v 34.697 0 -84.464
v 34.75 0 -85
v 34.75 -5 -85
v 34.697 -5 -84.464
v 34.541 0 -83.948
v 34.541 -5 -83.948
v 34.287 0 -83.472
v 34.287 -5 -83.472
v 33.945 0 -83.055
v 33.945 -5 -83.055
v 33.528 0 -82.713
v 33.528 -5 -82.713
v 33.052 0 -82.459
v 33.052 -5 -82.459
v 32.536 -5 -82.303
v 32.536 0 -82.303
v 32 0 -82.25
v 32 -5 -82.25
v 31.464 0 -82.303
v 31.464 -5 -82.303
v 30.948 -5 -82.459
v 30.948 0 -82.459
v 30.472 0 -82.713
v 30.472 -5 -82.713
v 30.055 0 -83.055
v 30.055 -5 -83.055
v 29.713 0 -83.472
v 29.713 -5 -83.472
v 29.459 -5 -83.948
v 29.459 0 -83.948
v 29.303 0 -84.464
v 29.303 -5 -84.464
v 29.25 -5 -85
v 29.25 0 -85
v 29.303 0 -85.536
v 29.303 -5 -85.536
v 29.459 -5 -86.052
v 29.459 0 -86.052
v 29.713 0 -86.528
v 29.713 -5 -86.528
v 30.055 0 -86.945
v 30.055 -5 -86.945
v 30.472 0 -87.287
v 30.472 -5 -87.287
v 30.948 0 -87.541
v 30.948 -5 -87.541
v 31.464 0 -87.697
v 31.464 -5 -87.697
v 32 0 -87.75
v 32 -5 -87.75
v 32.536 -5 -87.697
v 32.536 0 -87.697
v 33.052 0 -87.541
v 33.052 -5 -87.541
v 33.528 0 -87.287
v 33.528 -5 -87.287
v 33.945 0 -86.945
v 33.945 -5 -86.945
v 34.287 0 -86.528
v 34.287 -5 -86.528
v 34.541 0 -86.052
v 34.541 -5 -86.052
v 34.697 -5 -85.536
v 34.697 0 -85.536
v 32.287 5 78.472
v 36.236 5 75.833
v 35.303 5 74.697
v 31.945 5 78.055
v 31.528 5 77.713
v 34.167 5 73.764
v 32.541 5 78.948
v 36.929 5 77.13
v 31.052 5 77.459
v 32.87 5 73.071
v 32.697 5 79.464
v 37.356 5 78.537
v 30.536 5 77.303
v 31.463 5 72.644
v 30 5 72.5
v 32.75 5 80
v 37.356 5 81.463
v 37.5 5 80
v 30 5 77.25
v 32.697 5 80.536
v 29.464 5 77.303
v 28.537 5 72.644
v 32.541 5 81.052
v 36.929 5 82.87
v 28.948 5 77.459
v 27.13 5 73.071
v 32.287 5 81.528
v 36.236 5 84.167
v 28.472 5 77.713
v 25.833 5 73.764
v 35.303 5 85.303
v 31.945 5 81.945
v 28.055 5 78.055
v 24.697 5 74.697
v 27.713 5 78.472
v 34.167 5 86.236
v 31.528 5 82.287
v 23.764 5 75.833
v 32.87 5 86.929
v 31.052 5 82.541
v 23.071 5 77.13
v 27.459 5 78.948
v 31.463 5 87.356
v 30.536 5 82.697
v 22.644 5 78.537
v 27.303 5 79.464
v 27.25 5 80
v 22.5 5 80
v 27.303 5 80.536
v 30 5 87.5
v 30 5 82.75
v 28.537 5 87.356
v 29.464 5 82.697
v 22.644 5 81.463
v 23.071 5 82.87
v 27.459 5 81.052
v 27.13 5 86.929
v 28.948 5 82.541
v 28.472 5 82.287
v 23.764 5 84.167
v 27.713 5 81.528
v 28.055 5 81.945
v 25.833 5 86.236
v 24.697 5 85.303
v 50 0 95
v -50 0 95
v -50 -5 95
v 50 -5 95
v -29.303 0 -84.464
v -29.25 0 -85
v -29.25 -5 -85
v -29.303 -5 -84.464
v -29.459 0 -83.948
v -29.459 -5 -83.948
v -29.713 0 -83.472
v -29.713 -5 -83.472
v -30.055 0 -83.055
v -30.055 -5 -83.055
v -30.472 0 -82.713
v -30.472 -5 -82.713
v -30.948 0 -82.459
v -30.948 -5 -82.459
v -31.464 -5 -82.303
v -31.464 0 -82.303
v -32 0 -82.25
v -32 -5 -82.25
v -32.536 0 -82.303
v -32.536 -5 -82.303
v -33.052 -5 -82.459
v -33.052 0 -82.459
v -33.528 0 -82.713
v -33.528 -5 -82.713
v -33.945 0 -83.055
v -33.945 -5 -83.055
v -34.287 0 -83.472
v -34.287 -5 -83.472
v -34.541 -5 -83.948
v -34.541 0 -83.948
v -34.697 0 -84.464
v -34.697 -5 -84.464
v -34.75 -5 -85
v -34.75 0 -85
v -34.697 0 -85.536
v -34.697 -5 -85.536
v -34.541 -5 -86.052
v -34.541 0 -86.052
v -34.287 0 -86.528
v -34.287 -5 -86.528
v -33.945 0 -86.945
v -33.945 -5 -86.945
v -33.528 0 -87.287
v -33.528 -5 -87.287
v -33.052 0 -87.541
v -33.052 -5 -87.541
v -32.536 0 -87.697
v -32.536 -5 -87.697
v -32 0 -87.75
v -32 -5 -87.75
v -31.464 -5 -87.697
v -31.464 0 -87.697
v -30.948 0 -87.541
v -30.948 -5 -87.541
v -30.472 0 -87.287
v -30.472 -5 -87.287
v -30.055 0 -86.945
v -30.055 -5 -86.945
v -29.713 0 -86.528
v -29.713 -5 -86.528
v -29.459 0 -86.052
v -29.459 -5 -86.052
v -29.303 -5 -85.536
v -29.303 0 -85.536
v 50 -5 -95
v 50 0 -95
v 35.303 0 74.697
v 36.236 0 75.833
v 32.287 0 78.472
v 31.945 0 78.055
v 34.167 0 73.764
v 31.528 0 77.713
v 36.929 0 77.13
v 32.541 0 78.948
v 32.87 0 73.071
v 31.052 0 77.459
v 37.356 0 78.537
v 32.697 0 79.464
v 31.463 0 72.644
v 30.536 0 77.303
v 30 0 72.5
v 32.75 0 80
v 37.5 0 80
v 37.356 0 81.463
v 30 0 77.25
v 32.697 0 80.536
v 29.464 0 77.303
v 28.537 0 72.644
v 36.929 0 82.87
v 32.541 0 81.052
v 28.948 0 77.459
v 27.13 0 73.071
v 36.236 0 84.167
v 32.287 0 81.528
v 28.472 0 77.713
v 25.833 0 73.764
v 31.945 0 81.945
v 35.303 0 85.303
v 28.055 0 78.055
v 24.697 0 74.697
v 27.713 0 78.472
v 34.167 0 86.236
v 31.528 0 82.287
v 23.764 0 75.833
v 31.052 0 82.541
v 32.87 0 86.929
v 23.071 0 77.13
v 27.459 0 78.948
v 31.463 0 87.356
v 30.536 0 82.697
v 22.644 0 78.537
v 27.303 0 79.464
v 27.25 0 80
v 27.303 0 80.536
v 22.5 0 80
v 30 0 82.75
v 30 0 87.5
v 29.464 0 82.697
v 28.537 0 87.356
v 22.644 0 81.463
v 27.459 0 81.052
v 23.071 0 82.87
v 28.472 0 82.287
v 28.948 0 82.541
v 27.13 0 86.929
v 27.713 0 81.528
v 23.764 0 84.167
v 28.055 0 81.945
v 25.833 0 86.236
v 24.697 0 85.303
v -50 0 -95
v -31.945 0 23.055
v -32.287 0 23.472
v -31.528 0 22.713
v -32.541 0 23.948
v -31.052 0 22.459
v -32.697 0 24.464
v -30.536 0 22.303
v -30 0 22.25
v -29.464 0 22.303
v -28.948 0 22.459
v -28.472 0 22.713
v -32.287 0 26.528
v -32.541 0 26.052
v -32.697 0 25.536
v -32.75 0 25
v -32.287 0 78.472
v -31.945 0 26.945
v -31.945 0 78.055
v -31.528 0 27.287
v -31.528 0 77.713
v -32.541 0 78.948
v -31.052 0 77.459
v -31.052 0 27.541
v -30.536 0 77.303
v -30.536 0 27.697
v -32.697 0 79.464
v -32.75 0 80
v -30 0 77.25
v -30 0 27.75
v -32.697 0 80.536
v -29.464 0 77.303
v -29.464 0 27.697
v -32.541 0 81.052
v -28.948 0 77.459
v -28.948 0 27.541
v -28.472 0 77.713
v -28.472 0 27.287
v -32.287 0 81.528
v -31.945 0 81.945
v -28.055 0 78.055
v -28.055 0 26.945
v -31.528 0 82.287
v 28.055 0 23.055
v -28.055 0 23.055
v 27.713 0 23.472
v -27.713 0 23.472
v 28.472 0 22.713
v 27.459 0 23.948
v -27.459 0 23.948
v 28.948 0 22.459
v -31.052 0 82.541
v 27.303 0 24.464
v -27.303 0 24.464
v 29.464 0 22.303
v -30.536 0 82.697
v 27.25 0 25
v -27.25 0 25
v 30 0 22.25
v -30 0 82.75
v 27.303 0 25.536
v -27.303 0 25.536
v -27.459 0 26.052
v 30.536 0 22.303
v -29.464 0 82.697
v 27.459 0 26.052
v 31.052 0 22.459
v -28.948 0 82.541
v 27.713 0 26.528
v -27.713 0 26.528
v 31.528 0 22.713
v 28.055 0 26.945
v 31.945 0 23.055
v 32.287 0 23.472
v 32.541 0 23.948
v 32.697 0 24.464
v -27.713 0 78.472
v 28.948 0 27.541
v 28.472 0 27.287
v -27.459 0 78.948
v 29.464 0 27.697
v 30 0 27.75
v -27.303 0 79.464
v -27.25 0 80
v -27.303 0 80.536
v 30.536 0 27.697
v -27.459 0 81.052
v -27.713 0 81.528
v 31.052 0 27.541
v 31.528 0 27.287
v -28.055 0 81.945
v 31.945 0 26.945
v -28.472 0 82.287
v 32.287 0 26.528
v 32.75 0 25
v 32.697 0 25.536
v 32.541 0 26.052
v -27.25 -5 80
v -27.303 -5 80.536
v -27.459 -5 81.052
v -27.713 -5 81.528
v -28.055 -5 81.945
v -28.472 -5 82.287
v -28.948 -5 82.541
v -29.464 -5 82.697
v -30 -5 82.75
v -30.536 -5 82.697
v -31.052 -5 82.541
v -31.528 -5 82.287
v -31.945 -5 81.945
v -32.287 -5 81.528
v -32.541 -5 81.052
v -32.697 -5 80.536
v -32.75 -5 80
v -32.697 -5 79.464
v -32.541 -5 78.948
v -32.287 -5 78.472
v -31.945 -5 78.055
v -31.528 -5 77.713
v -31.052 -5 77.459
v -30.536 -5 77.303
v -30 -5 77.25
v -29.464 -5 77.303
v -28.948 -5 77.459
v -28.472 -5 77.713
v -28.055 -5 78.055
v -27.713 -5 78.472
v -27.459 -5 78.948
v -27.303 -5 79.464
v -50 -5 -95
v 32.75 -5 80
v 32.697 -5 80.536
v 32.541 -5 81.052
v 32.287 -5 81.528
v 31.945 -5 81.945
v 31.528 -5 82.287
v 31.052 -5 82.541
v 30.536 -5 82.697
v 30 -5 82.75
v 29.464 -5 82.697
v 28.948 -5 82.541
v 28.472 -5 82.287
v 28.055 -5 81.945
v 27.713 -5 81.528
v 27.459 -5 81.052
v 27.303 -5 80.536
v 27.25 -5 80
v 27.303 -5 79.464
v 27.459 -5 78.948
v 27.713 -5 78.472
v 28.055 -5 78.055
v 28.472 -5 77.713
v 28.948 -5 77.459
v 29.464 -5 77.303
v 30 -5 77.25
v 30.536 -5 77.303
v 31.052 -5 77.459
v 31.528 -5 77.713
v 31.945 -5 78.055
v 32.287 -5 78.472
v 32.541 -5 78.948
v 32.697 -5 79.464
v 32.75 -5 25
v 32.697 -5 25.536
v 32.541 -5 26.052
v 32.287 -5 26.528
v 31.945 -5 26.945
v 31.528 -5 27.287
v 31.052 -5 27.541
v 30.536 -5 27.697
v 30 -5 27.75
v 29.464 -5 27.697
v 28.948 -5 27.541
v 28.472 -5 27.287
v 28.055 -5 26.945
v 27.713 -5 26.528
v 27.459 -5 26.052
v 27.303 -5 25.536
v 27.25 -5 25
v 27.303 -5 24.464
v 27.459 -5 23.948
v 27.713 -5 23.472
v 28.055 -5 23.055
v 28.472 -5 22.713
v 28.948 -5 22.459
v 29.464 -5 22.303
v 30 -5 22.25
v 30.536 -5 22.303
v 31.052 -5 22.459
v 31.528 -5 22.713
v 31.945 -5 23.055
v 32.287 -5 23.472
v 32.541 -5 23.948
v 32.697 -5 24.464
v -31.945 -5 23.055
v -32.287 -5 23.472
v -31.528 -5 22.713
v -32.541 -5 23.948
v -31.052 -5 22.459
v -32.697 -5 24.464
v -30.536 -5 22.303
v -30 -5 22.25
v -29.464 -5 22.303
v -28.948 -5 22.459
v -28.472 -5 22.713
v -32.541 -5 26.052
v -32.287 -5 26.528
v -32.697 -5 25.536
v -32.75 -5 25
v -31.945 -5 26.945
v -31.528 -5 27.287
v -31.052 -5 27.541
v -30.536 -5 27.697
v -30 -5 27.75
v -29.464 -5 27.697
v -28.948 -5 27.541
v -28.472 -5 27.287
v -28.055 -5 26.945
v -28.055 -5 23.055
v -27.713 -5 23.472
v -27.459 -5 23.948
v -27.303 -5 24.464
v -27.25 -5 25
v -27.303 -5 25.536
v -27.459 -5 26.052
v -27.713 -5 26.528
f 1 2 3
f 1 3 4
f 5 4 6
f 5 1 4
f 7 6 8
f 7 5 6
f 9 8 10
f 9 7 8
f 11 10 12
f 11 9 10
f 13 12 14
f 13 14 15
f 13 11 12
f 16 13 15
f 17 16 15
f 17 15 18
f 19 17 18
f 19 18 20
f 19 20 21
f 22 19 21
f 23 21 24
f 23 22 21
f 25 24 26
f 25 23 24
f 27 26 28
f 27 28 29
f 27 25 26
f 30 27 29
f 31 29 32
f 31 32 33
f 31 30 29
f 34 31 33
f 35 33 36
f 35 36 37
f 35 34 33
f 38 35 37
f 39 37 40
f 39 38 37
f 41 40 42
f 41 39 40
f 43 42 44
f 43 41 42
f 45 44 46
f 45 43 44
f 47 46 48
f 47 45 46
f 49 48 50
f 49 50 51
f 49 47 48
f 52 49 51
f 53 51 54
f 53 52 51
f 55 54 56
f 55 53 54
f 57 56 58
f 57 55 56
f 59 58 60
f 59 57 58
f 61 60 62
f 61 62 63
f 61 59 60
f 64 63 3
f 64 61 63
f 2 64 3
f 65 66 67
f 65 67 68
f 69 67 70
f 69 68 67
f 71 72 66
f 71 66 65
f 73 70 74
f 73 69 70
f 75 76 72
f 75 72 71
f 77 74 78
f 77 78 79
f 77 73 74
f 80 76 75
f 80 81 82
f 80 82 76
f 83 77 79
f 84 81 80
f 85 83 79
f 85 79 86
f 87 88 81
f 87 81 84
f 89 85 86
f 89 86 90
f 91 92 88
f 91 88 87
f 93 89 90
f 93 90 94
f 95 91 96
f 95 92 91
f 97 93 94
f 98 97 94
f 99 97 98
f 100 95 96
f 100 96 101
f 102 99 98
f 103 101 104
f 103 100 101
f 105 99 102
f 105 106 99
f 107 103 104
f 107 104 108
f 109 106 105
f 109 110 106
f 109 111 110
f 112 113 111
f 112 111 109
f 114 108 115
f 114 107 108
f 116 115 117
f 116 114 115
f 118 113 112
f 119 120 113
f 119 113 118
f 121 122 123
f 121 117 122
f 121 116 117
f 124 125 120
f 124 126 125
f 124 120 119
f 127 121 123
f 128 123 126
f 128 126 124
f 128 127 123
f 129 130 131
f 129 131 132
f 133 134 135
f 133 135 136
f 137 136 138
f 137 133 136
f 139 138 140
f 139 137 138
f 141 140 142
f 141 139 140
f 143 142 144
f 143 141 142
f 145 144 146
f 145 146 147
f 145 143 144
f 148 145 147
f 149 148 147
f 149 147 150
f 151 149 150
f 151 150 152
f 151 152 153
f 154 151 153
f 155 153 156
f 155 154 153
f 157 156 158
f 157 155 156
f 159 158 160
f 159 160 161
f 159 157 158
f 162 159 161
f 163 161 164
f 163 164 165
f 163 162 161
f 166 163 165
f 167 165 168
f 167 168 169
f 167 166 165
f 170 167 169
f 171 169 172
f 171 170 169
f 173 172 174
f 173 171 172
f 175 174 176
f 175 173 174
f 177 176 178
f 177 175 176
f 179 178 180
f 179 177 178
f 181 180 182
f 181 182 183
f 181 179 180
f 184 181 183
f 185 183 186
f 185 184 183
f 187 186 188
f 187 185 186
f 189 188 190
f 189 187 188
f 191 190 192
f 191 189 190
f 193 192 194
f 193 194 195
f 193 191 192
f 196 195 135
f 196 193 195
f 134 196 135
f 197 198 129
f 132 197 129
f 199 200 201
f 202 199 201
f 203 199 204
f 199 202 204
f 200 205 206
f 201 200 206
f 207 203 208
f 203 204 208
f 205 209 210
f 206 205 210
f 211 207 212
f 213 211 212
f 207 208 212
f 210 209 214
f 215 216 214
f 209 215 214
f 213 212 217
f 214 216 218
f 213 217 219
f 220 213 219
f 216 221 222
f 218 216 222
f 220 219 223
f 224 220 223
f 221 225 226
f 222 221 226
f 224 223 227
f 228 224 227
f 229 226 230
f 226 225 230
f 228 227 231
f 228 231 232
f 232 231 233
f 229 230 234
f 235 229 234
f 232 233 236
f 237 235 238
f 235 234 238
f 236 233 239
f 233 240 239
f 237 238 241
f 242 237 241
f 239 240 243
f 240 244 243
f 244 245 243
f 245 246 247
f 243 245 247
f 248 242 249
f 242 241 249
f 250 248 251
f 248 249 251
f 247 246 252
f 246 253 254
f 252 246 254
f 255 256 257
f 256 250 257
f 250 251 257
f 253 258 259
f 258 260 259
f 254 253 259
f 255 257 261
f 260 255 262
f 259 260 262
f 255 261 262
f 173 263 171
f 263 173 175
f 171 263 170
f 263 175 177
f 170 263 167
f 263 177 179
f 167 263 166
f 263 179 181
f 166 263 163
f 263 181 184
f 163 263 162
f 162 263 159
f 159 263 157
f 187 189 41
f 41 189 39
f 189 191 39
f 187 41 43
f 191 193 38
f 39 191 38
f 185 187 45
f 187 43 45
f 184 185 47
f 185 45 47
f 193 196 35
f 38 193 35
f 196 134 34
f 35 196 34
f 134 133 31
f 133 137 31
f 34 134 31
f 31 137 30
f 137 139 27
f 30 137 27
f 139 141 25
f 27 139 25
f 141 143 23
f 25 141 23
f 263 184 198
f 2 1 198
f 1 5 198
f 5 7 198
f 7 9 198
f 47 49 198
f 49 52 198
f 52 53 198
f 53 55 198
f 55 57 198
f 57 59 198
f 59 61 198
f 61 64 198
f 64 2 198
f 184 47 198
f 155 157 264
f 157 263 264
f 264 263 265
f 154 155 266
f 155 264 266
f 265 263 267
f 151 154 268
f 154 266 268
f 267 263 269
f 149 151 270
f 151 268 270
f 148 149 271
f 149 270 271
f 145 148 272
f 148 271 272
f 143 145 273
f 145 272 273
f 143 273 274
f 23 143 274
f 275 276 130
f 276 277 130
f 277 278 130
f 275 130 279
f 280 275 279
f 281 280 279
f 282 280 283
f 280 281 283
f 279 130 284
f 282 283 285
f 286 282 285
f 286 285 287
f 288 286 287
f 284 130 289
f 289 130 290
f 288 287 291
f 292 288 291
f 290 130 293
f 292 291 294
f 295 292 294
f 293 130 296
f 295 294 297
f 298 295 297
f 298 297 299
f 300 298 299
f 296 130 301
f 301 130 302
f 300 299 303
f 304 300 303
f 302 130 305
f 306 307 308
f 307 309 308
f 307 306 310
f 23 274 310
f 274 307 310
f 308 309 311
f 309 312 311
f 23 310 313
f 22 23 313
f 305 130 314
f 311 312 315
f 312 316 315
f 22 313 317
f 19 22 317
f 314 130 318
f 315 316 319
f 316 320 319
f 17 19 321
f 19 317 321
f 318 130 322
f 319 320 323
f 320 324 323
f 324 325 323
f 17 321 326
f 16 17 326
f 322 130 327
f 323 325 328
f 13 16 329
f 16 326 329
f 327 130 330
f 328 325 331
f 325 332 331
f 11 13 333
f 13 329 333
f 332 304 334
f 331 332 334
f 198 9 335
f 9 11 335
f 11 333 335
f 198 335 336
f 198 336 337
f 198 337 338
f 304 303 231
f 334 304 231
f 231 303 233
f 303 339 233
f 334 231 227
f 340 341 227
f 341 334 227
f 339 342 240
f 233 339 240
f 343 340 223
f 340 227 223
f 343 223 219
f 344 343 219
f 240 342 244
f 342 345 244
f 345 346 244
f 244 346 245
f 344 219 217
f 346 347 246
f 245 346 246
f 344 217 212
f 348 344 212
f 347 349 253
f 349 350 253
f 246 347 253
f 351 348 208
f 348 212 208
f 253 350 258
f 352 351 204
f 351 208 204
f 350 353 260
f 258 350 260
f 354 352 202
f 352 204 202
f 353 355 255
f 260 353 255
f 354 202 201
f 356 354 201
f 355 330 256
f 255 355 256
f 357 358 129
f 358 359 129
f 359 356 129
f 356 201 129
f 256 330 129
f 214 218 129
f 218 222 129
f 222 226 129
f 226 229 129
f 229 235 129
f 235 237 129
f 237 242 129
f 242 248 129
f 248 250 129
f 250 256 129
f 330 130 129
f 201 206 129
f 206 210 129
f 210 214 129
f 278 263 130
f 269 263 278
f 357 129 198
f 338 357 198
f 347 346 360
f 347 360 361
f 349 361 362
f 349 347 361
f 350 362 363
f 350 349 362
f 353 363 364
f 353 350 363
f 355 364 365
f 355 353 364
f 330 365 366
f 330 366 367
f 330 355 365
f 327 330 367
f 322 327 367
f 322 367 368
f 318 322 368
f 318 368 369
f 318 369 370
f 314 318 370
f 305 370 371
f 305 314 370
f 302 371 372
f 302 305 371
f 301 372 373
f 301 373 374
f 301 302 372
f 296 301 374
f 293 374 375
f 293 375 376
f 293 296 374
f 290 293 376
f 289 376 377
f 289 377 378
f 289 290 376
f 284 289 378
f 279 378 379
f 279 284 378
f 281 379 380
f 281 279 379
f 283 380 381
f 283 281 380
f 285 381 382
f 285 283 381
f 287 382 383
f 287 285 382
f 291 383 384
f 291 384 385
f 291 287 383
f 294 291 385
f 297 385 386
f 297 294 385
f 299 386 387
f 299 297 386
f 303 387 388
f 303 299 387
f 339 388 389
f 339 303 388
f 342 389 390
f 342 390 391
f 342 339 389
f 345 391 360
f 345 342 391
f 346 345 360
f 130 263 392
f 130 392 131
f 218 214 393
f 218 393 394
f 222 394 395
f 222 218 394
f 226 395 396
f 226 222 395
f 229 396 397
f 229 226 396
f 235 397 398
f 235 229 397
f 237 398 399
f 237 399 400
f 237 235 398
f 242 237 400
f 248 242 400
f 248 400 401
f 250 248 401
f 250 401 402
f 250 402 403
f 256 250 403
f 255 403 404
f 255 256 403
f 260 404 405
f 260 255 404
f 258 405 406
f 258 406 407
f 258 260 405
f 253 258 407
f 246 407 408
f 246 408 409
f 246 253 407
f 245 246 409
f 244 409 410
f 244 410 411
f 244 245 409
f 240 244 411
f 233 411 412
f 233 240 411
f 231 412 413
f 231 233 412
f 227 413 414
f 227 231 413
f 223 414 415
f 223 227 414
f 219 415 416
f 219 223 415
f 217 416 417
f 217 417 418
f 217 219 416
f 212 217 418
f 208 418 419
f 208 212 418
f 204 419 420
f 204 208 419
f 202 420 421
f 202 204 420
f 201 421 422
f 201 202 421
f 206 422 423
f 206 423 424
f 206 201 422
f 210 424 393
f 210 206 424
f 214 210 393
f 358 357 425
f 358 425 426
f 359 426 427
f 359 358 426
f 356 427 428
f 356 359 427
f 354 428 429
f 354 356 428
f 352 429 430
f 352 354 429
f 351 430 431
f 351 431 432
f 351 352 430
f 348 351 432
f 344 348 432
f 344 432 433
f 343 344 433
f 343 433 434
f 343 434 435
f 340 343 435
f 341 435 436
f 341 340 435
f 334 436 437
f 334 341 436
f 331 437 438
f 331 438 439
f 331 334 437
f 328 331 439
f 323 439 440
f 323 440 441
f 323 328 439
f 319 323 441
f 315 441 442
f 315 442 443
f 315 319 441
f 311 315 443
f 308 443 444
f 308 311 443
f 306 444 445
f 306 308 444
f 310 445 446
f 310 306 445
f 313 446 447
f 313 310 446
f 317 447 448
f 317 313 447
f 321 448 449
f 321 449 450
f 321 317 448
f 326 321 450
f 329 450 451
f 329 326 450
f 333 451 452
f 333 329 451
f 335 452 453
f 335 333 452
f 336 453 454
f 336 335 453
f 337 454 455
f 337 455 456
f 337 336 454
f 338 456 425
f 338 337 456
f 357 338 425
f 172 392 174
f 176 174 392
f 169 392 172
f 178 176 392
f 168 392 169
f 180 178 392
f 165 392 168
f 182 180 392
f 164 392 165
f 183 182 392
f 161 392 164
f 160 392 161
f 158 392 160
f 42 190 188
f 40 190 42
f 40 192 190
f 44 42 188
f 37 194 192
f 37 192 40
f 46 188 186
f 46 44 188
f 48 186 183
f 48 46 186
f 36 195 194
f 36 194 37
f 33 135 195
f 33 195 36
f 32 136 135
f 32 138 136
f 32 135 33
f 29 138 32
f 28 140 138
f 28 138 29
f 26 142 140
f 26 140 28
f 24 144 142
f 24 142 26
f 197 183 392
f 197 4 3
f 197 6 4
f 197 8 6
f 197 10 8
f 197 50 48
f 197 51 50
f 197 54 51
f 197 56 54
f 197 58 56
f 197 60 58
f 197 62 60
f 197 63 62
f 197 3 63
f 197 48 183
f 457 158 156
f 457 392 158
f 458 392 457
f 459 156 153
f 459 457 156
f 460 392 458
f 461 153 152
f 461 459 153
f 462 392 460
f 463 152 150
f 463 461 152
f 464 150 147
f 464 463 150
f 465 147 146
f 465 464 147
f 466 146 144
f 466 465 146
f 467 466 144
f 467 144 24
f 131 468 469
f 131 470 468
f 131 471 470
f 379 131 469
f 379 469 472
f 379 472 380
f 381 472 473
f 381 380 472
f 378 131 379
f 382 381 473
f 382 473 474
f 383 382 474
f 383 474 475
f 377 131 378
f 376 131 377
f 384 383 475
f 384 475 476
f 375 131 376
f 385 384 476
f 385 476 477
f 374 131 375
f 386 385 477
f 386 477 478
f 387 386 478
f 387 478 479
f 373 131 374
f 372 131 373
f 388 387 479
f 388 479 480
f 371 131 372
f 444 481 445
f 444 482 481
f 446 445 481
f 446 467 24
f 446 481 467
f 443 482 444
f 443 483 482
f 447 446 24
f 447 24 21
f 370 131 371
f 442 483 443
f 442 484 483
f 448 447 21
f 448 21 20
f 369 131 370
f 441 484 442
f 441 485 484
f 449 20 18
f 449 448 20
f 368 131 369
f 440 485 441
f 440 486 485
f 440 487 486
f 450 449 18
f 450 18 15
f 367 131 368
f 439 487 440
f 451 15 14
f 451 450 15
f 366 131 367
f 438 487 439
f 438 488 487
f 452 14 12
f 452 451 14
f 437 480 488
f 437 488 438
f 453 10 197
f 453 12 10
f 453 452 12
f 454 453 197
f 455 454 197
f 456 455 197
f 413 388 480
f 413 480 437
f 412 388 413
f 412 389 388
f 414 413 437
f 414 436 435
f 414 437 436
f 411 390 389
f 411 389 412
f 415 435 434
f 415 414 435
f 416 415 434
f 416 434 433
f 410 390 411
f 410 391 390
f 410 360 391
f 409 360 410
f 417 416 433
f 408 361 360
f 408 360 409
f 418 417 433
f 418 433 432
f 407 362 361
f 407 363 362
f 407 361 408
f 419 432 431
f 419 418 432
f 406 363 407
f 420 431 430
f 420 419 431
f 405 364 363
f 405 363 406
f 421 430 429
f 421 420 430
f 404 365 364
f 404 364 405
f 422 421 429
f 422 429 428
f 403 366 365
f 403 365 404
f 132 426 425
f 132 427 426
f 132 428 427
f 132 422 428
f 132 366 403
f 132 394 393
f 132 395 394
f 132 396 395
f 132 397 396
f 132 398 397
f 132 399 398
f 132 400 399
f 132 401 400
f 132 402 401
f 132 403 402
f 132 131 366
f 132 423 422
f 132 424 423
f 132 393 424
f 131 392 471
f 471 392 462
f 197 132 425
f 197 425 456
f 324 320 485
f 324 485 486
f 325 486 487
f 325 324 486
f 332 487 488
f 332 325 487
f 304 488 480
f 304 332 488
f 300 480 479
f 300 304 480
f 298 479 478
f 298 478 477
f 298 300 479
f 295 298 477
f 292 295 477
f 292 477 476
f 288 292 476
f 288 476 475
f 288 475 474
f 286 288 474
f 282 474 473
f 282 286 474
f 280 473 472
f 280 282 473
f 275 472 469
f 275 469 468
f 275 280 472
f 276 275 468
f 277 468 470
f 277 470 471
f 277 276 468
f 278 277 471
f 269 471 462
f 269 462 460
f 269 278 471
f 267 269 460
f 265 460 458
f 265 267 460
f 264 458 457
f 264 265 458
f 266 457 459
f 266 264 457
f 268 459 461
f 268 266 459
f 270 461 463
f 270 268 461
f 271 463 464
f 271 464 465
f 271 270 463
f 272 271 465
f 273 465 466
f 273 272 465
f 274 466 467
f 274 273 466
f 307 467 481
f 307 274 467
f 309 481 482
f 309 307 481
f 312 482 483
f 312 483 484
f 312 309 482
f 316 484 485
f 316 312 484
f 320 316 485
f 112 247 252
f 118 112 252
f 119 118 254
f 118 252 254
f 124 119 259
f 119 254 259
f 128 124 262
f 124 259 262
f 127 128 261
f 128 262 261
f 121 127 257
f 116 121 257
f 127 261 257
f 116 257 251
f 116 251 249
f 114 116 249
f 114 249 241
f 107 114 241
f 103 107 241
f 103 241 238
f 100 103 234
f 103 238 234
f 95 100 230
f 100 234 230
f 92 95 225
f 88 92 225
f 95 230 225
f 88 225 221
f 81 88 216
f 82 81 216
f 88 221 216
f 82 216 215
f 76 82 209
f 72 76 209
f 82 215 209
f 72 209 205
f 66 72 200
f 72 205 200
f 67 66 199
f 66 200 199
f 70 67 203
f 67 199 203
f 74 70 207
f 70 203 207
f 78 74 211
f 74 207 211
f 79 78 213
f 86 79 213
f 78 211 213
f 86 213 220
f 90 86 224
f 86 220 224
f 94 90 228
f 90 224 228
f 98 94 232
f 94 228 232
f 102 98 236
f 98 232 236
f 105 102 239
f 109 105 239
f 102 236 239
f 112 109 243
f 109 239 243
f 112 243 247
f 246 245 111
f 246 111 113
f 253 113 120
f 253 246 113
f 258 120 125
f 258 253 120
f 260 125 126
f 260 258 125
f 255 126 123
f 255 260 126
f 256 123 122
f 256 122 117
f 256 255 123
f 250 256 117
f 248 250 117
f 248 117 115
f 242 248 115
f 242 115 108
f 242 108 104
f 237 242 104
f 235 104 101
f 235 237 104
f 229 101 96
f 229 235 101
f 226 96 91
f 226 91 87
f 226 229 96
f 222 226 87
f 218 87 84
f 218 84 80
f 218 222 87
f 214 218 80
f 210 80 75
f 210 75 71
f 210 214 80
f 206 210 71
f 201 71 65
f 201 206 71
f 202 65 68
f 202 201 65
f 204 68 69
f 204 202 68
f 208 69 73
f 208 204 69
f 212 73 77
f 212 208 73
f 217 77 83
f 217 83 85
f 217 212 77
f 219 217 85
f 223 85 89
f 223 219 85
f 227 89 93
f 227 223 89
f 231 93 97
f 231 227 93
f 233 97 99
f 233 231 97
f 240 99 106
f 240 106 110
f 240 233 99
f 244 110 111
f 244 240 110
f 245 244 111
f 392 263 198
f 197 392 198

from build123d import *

# Parameters (mm, degrees)
F0_W     = 100
F0_H     = 190
F0_R     = 2.75
F1_DEPTH = 5
F3_R     = 7.5
F3_R_2   = 2.75
F4_DEPTH = 5


with BuildPart() as f1:
    # F0 (on Front) → F1 (new body)
    with BuildSketch(Plane.XZ):
        Rectangle(F0_W, F0_H)
        with Locations((-32, -85)):
            Circle(F0_R, mode=Mode.SUBTRACT)
        with Locations((32, -85)):
            Circle(F0_R, mode=Mode.SUBTRACT)
        with Locations((-30, 25)):
            Circle(F0_R, mode=Mode.SUBTRACT)
        with Locations((-30, 80)):
            Circle(F0_R, mode=Mode.SUBTRACT)
        with Locations((30, 25)):
            Circle(F0_R, mode=Mode.SUBTRACT)
        with Locations((30, 80)):
            Circle(F0_R, mode=Mode.SUBTRACT)
    extrude(amount=F1_DEPTH)


with BuildPart() as f4:
    # F3 (on face) → F4 (new body)
    with BuildSketch(Plane(origin=(0, 0, 0), x_dir=(-1, 0, 0), z_dir=(0, 1, 0))):
        with Locations((-30, 80)):
            Circle(F3_R)
        with Locations((-30, 80)):
            Circle(F3_R_2, mode=Mode.SUBTRACT)
    extrude(amount=F4_DEPTH)


solid = Compound([f1.part, f4.part])
